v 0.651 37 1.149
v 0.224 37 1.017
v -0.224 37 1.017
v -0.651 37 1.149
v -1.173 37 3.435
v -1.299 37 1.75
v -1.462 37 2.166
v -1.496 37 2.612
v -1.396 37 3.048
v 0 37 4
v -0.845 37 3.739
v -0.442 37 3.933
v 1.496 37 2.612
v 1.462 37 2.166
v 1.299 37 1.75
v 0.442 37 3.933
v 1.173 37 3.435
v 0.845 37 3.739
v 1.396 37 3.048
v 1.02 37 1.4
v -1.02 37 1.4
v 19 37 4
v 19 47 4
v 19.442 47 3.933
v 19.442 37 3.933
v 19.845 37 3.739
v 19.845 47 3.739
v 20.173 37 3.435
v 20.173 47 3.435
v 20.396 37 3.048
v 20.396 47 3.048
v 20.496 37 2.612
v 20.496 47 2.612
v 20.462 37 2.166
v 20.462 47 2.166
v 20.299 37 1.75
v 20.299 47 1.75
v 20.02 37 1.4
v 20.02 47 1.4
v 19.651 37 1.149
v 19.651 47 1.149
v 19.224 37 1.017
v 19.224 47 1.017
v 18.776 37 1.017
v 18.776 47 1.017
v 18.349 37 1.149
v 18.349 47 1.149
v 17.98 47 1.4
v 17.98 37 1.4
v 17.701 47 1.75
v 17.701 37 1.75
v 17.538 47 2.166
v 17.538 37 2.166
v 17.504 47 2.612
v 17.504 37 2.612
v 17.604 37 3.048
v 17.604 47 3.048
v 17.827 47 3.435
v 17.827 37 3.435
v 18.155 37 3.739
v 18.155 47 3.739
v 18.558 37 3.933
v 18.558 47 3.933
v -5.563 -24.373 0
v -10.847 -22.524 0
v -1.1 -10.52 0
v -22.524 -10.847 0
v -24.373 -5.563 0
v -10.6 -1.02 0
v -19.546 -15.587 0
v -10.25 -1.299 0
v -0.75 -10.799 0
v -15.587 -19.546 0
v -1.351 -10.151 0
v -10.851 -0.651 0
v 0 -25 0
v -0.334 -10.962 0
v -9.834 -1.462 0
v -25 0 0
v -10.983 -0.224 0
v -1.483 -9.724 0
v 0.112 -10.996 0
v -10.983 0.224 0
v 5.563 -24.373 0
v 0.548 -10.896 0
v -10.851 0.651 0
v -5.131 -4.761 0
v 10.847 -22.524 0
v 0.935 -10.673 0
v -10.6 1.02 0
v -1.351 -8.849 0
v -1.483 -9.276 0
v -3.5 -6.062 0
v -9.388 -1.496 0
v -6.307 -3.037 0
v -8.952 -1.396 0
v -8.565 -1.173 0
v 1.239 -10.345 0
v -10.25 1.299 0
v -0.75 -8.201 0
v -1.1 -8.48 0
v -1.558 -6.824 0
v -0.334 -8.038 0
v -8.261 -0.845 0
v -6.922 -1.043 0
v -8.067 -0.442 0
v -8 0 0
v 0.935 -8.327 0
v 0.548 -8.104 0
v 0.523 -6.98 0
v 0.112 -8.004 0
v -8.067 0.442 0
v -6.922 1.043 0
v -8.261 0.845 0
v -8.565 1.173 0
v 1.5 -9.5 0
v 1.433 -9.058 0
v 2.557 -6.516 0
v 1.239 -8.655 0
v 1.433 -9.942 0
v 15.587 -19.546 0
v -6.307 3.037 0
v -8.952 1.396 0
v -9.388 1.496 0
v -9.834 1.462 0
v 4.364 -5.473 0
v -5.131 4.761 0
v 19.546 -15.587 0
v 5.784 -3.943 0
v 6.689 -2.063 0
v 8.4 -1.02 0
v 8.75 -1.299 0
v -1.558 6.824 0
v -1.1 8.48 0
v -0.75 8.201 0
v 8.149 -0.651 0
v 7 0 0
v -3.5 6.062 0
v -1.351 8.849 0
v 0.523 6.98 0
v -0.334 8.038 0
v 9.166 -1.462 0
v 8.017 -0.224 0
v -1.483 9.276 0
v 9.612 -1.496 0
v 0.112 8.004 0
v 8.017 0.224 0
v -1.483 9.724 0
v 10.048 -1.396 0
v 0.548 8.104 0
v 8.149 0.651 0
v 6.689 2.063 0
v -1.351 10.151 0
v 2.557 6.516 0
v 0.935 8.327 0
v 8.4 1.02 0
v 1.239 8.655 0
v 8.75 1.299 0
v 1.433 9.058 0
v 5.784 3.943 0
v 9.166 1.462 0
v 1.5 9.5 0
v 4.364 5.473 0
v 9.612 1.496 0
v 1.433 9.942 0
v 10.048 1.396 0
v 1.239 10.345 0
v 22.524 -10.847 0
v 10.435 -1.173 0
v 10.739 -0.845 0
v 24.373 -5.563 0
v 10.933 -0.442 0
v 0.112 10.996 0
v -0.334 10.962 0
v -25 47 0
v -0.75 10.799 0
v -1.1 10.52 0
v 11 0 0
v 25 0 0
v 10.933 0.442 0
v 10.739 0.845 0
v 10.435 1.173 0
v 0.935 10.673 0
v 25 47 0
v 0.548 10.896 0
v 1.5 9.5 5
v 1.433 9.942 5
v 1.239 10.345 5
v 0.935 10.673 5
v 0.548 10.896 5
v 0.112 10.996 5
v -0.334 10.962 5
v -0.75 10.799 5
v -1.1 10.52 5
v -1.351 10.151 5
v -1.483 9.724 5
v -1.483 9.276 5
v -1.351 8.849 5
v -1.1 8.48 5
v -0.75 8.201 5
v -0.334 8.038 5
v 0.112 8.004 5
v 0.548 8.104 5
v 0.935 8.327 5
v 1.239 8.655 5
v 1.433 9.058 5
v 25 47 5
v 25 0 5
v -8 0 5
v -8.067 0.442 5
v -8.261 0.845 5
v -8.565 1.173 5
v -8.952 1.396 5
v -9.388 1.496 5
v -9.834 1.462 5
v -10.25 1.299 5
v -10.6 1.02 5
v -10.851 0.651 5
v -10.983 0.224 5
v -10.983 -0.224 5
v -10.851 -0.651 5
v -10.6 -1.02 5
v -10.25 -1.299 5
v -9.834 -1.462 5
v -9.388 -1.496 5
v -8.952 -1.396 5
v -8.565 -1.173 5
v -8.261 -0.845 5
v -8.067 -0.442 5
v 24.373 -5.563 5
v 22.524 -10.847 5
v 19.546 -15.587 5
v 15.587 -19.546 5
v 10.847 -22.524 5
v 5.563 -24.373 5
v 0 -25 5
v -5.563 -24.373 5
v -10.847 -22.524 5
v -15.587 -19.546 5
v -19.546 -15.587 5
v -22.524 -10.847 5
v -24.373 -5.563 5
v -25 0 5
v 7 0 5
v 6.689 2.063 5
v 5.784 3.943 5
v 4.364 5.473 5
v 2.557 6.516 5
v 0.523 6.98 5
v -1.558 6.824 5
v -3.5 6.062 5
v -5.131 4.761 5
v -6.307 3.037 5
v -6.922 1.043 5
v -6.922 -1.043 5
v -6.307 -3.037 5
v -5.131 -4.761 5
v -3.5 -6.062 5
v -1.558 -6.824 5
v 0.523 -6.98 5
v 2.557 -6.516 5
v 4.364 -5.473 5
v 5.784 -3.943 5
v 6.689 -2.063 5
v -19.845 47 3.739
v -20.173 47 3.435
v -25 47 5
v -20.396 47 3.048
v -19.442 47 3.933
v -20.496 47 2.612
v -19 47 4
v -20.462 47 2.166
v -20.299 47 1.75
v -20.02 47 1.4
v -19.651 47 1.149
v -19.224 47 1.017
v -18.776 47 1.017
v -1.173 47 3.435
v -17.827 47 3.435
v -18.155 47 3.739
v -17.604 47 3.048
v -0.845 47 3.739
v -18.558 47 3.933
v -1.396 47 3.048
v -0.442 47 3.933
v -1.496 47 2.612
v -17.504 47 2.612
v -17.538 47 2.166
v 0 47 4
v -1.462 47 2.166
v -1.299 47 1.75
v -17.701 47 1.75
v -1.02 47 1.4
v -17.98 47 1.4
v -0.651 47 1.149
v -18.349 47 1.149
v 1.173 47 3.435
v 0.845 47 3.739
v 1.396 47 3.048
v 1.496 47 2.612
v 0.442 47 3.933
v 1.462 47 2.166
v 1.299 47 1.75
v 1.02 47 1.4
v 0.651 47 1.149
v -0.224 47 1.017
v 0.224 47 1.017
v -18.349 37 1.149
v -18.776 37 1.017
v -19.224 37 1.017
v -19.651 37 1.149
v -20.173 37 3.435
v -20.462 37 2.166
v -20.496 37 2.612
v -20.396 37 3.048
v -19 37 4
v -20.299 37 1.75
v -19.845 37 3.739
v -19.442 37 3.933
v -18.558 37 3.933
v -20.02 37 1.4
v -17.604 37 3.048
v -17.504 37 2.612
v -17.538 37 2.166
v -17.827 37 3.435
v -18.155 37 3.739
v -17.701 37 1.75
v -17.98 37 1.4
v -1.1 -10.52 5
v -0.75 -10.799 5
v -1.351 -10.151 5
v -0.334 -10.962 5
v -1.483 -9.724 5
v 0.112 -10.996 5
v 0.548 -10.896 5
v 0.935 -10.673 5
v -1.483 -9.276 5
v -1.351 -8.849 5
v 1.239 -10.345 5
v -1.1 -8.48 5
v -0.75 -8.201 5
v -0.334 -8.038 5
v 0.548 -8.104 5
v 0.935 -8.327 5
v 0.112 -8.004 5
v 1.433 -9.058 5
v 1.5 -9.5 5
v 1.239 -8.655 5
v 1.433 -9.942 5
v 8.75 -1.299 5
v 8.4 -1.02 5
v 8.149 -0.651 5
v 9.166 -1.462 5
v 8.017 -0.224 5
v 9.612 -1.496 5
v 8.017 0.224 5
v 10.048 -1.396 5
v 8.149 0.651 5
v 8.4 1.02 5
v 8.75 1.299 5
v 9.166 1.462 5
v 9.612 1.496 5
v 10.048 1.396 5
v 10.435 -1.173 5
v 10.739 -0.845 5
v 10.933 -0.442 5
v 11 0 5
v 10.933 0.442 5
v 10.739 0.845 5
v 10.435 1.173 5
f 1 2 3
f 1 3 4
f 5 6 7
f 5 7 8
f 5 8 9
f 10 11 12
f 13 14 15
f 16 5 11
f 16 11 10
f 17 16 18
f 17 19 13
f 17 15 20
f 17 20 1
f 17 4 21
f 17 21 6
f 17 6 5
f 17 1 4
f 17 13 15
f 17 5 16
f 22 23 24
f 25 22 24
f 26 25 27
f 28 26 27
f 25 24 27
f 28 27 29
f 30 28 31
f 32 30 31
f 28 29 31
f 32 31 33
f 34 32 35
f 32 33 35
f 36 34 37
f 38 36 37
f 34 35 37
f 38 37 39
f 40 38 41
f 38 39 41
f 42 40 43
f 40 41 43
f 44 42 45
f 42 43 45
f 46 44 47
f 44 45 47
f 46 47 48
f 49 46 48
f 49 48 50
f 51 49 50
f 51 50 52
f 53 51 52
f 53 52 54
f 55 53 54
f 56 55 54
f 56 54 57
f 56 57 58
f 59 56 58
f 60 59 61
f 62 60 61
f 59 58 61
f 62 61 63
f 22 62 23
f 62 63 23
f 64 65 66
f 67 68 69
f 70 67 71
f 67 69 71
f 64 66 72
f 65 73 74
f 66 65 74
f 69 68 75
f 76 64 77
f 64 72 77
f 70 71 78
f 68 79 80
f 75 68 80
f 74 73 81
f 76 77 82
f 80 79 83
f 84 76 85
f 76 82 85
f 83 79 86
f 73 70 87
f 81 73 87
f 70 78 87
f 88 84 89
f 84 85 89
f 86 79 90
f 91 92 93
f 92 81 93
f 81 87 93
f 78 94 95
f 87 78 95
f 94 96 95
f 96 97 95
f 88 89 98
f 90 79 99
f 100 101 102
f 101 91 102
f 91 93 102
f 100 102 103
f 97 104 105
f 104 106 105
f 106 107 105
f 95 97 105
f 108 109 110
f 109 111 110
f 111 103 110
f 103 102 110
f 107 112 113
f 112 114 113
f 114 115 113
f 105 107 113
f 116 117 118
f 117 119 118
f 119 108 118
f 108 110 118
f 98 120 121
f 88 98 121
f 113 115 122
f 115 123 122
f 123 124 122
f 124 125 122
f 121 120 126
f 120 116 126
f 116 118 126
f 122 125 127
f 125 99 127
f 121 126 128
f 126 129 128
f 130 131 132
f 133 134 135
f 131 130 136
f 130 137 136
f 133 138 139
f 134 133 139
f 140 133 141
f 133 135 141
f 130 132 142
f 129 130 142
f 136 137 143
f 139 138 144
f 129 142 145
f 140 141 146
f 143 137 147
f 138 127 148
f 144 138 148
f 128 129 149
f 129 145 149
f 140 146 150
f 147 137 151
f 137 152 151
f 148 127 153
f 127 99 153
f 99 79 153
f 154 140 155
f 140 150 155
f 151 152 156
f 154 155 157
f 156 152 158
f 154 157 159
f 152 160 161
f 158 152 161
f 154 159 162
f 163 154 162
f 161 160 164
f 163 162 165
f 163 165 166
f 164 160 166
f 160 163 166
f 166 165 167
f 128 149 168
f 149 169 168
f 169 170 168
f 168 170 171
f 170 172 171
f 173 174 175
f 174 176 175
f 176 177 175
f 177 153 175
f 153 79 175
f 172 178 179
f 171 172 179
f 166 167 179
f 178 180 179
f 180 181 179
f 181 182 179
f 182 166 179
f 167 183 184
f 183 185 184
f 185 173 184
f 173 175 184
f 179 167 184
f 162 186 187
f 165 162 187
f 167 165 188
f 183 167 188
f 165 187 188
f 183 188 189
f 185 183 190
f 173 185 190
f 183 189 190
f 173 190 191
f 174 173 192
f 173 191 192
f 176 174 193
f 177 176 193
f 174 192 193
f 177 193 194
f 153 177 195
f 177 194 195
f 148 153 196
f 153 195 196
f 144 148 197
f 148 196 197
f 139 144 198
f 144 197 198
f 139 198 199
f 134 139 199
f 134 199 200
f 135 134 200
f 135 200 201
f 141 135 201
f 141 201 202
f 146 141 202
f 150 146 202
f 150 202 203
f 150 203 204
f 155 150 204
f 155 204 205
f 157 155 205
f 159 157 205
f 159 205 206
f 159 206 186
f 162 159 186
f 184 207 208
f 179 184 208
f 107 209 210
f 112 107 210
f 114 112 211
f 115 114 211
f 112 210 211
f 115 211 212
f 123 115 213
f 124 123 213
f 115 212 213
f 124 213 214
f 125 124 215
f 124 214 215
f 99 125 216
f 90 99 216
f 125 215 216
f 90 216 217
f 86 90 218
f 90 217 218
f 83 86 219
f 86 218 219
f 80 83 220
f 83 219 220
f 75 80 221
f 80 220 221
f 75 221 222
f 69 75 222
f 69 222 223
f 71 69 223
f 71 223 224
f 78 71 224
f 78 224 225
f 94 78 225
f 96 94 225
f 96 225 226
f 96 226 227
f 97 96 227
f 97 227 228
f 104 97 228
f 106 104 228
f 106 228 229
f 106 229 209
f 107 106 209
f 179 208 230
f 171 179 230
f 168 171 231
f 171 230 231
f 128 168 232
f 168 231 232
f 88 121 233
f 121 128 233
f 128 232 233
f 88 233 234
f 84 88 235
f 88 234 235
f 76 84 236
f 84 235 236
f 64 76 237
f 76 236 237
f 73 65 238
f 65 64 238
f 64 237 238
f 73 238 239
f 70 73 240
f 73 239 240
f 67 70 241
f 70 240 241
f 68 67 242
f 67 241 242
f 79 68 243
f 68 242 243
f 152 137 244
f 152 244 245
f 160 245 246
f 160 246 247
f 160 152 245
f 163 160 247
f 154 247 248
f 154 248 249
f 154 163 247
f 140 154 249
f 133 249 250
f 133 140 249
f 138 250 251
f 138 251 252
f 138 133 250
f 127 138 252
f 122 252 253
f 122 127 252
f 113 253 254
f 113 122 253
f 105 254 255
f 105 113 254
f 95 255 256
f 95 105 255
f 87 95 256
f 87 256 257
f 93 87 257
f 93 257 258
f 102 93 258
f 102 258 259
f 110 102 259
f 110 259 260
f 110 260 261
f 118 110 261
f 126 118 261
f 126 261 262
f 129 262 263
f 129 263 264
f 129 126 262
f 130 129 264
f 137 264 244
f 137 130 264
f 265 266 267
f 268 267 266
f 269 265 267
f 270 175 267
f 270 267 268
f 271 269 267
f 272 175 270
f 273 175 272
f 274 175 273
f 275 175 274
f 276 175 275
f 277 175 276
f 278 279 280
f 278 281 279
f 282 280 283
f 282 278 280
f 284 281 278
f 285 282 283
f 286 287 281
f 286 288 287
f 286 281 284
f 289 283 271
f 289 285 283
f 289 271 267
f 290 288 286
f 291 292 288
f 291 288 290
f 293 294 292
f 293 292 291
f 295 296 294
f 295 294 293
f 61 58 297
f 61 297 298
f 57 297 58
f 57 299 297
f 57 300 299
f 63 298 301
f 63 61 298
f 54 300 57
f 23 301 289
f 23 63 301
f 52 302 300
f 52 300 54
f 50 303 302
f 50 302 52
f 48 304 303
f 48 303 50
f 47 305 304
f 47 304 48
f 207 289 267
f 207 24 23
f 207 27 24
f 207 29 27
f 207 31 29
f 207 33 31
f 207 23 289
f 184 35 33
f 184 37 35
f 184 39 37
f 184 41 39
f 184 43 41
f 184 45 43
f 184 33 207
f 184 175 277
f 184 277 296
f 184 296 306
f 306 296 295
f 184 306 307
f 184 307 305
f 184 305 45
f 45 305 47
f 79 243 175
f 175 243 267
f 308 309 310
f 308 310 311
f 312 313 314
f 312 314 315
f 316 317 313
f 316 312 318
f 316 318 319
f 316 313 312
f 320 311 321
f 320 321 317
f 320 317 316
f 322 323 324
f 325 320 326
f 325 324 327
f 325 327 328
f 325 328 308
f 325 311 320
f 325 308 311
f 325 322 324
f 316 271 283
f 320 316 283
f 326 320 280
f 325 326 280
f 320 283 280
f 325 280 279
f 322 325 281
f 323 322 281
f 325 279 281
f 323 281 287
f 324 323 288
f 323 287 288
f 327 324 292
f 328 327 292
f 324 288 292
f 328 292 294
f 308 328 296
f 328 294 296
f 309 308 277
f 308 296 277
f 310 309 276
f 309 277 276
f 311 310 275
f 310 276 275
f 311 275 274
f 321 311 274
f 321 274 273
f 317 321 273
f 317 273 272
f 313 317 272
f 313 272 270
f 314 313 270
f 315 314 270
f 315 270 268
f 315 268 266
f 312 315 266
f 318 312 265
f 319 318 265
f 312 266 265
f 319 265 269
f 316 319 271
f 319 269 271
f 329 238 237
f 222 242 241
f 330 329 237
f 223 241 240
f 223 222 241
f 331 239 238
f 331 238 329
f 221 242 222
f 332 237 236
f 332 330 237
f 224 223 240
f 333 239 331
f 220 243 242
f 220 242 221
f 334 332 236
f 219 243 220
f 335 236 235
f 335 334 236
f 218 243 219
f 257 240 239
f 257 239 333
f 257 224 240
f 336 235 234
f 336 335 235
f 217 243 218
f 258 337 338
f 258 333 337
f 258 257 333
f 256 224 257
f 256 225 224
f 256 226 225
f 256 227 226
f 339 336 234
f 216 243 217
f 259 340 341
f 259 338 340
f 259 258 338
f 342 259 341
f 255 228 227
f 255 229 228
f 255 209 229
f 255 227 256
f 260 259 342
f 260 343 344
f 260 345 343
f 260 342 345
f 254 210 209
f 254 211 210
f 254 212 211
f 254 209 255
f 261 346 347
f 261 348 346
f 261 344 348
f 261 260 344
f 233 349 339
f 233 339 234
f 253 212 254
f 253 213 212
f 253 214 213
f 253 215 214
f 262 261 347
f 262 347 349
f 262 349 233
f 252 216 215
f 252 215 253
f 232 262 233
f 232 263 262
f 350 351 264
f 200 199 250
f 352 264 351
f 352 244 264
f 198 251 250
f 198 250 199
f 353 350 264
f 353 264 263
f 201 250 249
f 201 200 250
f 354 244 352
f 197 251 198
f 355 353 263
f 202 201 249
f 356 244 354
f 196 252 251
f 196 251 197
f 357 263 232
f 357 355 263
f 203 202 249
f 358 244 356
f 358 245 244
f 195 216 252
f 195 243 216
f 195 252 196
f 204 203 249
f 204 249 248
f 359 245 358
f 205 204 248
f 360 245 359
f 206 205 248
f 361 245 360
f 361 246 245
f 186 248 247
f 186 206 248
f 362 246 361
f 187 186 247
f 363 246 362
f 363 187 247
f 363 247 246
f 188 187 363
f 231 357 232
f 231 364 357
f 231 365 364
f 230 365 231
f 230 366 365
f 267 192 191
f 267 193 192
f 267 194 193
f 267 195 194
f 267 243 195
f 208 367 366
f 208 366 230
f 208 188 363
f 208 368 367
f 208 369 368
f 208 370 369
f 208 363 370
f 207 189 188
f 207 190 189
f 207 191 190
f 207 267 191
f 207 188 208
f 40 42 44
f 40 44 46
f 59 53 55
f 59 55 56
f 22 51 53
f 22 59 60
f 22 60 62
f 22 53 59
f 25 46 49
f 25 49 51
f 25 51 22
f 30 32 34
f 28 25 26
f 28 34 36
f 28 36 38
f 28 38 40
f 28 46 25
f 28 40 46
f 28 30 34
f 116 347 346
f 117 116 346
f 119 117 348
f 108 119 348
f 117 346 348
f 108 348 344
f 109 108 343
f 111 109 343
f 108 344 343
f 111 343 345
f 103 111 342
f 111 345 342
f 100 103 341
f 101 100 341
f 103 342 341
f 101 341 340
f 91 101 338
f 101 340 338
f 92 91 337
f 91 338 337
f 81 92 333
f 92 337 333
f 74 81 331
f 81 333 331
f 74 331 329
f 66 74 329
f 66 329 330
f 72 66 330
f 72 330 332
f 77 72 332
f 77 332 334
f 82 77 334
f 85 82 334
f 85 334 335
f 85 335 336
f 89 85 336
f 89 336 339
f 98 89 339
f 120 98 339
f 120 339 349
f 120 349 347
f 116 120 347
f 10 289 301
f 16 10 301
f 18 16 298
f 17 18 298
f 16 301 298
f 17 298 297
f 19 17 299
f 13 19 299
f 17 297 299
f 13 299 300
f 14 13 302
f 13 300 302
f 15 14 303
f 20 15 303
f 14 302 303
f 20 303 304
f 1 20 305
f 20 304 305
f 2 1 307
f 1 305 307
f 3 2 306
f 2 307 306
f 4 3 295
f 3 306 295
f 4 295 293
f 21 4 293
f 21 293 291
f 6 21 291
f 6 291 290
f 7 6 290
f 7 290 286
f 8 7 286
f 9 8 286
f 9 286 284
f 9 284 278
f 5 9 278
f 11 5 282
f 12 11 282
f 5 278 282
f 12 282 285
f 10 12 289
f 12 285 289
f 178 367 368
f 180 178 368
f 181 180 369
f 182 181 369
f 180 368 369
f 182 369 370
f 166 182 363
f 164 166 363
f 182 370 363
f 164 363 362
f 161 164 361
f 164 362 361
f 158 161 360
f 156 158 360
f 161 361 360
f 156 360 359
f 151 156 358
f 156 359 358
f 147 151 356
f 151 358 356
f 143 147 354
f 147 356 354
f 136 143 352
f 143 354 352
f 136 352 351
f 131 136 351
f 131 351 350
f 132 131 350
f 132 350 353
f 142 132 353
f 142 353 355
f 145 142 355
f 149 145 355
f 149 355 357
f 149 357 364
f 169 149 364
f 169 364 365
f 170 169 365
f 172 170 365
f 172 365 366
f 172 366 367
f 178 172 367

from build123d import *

# Parameters (mm, degrees)
ESQUISSE1_W             = 94
ESQUISSE1_H             = 93.807810261
ESQUISSE1_R             = 7
BOSS_EXTRU_1_DEPTH      = 5
ESQUISSE2_R             = 1.5
ENL_V_MAT_EXTRU_1_DEPTH = 67.655832453
ESQUISSE3_R             = 1.5
ENL_V_MAT_EXTRU_2_DEPTH = 10


with BuildPart() as part:
    # Esquisse1 → Boss.-Extru.1 (new body)
    with BuildSketch(Plane.XY):
        with Locations((0, 0.096094869)):
            Rectangle(ESQUISSE1_W, ESQUISSE1_H)
        Circle(ESQUISSE1_R, mode=Mode.SUBTRACT)
    extrude(amount=BOSS_EXTRU_1_DEPTH)

    # Esquisse2 → Enlèv. mat.-Extru.1 (cut, through all)
    with BuildSketch(Plane.XY.offset(5)):
        with Locations((9.5, 0)):
            Circle(ESQUISSE2_R)
        with BuildLine():
            Line((25, 47), (25, 0))
            ThreePointArc((25, 0), (0, -25), (-25, 0))
            Line((-25, 0), (-25, 47))
            Line((-25, 47), (-47, 47))
            Line((-47, 47), (-47, -46.807810261))
            Line((-47, -46.807810261), (47, -46.807810261))
            Line((47, -46.807810261), (47, 47))
            Line((47, 47), (25, 47))
        make_face()
        with Locations((-9.5, 0)):
            Circle(ESQUISSE2_R)
        with Locations((0, 9.5)):
            Circle(ESQUISSE2_R)
        with Locations((0, -9.5)):
            Circle(ESQUISSE2_R)
    extrude(amount=-ENL_V_MAT_EXTRU_1_DEPTH, mode=Mode.SUBTRACT)

    # Esquisse3 → Enlèv. mat.-Extru.2 (cut)
    with BuildSketch(Plane(origin=(0, 47, 0), x_dir=(1, 0, 0), z_dir=(0, 1, 0))):
        with Locations(Location((0, -2.5, 0), (0, 0, 270))):
            Circle(ESQUISSE3_R)
        with Locations(Location((-19, -2.5, 0), (0, 0, 270))):
            Circle(ESQUISSE3_R)
        with Locations(Location((19, -2.5, 0), (0, 0, 270))):
            Circle(ESQUISSE3_R)
    extrude(amount=-ENL_V_MAT_EXTRU_2_DEPTH, mode=Mode.SUBTRACT)


solid = part.part
